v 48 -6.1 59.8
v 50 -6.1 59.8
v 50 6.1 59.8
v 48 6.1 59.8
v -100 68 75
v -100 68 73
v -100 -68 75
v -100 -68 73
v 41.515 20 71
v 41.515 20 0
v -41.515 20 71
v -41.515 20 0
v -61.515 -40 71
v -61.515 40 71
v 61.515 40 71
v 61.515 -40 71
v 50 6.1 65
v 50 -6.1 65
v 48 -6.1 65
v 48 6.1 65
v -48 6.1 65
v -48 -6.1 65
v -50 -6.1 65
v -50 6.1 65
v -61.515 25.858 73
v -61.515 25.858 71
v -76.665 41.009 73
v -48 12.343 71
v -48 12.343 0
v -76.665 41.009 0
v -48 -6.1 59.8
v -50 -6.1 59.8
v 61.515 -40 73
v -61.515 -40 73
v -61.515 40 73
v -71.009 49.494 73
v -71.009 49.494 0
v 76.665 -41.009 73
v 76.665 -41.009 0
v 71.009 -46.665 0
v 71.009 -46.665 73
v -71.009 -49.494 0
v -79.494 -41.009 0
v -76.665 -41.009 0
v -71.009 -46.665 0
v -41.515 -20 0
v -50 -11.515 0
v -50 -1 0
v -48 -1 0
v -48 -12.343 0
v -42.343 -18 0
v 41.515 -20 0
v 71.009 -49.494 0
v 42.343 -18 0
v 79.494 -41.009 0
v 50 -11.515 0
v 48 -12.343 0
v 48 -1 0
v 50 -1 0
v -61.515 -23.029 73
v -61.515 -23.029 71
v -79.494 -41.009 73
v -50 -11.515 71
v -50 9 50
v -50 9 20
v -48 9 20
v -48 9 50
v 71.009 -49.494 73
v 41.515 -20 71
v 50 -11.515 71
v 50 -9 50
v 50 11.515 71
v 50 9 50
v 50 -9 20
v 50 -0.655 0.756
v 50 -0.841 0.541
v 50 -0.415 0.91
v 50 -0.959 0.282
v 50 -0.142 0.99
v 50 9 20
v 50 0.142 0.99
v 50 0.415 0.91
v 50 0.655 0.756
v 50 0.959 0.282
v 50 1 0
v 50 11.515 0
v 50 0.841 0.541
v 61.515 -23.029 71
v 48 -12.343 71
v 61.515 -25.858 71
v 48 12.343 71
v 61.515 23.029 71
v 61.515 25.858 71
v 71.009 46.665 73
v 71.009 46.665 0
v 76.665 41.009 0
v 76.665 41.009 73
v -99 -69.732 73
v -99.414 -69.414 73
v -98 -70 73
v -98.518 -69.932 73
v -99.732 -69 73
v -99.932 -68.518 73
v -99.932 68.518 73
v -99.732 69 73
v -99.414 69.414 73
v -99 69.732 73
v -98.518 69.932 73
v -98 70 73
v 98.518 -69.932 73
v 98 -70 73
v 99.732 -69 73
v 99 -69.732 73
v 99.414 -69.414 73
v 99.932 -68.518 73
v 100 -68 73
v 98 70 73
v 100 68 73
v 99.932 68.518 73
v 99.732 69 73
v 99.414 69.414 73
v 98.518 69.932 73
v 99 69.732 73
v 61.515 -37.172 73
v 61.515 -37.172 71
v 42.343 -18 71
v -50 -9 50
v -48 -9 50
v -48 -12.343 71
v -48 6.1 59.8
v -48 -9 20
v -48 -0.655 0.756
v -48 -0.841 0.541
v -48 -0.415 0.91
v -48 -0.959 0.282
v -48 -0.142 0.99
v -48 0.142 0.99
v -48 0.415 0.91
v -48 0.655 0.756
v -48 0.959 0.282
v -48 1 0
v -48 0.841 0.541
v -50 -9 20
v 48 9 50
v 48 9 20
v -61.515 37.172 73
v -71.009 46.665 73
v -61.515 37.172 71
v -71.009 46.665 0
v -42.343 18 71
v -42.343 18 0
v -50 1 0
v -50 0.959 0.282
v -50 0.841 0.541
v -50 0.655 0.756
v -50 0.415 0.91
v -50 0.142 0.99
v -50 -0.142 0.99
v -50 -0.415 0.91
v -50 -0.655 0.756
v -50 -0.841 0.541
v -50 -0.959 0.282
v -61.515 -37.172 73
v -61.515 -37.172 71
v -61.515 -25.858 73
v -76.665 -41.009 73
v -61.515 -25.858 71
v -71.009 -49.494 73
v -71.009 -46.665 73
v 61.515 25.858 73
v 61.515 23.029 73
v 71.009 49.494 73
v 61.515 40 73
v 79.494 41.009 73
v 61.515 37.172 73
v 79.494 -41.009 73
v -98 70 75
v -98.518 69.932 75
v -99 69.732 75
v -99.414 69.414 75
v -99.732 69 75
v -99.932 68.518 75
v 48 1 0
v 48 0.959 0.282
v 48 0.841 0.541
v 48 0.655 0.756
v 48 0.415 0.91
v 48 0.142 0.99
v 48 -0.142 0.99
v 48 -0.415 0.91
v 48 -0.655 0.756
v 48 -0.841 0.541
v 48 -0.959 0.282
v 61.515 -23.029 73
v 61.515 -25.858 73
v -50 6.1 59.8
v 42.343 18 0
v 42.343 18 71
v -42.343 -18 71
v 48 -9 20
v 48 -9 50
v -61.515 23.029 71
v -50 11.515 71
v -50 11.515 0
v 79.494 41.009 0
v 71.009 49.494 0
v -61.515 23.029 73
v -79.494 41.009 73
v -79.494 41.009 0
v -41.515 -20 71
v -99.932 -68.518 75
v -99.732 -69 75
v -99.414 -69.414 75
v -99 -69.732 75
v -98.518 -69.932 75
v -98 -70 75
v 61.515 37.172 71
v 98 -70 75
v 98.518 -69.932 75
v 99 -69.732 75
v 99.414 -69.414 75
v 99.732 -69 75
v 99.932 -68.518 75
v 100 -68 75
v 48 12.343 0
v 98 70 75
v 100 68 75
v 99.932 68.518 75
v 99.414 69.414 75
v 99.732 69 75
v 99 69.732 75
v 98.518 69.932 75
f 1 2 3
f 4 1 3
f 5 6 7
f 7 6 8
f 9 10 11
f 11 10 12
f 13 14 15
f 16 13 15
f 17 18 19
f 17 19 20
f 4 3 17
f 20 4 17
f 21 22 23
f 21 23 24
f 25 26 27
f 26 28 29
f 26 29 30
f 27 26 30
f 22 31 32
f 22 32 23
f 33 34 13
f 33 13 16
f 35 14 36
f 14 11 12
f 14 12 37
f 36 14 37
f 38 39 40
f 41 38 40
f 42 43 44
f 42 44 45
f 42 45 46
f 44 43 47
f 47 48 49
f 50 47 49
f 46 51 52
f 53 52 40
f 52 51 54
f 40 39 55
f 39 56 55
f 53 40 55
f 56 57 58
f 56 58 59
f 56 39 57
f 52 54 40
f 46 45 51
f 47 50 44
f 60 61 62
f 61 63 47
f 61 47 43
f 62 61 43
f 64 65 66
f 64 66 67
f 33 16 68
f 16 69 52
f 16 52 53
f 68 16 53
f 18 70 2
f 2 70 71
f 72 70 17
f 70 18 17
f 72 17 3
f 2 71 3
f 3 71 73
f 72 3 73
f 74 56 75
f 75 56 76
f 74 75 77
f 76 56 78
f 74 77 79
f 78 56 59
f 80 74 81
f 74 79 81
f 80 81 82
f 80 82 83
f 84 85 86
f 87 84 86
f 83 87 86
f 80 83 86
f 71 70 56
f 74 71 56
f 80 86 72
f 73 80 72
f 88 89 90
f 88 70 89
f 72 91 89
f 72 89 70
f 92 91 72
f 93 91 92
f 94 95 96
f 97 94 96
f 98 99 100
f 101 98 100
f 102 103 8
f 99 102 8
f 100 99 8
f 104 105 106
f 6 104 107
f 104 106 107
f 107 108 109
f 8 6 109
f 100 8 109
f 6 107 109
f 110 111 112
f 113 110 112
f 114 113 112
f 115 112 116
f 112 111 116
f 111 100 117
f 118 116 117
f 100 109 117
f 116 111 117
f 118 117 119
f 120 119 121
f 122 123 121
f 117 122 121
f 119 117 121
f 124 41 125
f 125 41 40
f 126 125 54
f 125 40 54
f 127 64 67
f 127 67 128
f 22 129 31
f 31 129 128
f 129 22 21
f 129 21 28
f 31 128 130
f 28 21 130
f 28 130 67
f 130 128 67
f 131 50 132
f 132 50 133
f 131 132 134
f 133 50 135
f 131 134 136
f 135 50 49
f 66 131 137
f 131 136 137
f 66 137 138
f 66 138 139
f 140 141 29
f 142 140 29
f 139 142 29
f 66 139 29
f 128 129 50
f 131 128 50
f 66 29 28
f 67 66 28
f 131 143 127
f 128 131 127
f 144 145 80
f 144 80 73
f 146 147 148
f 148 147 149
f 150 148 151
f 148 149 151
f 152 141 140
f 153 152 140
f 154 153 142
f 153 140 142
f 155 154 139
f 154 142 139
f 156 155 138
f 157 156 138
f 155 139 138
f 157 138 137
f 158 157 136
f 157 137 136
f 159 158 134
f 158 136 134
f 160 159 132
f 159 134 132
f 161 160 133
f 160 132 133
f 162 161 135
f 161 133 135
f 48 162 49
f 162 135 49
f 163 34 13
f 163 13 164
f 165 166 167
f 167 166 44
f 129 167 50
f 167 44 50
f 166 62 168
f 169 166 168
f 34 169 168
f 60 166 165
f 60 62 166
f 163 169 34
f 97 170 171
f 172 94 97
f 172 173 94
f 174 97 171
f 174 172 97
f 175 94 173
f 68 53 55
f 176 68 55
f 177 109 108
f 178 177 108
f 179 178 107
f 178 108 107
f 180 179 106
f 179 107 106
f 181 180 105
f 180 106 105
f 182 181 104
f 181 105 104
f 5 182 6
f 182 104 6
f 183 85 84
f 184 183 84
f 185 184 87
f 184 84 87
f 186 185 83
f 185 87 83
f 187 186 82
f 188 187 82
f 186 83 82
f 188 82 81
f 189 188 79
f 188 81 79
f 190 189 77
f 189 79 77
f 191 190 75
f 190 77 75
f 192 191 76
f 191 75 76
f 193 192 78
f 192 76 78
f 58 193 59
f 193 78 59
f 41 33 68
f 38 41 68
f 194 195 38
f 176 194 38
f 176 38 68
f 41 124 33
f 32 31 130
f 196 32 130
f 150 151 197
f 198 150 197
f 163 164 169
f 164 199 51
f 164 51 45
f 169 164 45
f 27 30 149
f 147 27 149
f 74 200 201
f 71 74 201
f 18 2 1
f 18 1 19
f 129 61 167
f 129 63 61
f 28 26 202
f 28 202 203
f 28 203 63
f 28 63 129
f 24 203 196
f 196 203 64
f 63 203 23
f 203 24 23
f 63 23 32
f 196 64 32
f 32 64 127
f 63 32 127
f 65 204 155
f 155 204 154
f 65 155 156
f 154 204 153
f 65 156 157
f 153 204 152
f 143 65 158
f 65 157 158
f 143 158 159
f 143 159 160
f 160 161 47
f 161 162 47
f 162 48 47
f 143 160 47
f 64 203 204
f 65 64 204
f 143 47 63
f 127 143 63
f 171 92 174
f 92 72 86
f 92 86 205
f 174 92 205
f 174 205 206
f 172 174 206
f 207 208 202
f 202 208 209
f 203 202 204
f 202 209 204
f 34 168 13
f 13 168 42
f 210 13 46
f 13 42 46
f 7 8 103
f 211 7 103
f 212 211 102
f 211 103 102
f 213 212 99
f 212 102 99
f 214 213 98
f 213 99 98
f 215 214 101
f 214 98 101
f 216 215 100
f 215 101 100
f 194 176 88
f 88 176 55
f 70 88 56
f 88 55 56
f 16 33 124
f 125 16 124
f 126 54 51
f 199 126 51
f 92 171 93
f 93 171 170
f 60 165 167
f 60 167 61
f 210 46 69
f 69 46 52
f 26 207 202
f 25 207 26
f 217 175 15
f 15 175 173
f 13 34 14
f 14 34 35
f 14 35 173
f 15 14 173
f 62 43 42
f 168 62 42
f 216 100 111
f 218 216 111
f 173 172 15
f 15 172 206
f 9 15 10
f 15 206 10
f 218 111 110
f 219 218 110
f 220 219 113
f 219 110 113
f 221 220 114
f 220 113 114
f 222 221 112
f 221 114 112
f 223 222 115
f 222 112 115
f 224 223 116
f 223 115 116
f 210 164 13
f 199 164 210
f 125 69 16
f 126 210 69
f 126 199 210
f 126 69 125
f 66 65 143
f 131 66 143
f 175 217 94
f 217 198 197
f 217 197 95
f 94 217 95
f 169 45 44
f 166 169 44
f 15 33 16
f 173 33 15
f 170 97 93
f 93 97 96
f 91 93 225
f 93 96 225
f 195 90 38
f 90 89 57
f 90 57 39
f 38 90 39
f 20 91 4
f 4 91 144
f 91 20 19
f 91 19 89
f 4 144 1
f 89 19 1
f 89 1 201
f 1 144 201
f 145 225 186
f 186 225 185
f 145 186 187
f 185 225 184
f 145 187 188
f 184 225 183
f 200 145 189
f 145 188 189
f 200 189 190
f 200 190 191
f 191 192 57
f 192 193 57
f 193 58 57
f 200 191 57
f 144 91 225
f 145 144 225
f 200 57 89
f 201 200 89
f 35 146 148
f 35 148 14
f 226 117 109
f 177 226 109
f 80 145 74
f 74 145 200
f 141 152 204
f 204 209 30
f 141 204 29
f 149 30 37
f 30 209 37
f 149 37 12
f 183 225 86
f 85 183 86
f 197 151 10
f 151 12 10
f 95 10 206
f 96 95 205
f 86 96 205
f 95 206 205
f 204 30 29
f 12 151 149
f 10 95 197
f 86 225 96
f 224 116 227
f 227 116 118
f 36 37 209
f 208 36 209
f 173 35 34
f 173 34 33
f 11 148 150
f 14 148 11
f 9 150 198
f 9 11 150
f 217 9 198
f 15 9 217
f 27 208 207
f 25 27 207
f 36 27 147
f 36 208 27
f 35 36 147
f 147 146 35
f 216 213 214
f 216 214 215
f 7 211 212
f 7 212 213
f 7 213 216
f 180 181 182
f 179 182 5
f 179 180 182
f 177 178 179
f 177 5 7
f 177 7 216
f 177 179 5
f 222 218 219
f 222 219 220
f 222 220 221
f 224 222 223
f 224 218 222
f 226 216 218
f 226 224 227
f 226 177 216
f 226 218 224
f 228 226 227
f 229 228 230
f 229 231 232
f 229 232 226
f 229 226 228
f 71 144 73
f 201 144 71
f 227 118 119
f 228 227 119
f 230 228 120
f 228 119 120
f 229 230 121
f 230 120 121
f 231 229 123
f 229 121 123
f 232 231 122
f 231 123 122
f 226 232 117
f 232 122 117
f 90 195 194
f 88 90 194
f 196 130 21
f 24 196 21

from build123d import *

# Parameters (mm, degrees)
F2_DEPTH  = 2
F5_DEPTH  = 73
F6_W      = 123.029438
F6_H      = 80
F7_DEPTH  = 2
F9_DEPTH  = 2
F10_W     = 18
F10_H     = 30
F11_DEPTH = 150.001
F12_W     = 12.2
F12_H     = 5.2
F13_DEPTH = 150.001
F15_DEPTH = 150.001


with BuildPart() as f2:
    # F1 (on offset) → F2 (new body)
    with BuildSketch(Plane.XY.offset(73)):
        with BuildLine():
            Line((98, 70), (-98, 70))
            ThreePointArc((-98, 70), (-99.414214, 69.414214), (-100, 68))
            Line((-100, 68), (-100, -68))
            ThreePointArc((-100, -68), (-99.414214, -69.414214), (-98, -70))
            Line((-98, -70), (98, -70))
            ThreePointArc((98, -70), (99.414214, -69.414214), (100, -68))
            Line((100, -68), (100, 68))
            ThreePointArc((100, 68), (99.414214, 69.414214), (98, 70))
        make_face()
    extrude(amount=F2_DEPTH)


with BuildPart() as f5:
    # F4 (on Top) → F5 (new body, through all)
    with BuildSketch(Plane.XY):
        Polygon((41.514719, 20), (-41.514719, 20), (-71.008622, 49.493903), (-79.493903, 41.008622), (-50, 11.514719), (-50, -11.514719), (-79.493903, -41.008622), (-71.008622, -49.493903), (-41.514719, -20), (41.514719, -20), (71.008622, -49.493903), (79.493903, -41.008622), (50, -11.514719), (50, 11.514719), (79.493903, 41.008622), (71.008622, 49.493903), align=None)
        Polygon((-76.665476, 41.008622), (-71.008622, 46.665476), (-42.343146, 18), (42.343146, 18), (71.008622, 46.665476), (76.665476, 41.008622), (48, 12.343146), (48, -12.343146), (76.665476, -41.008622), (71.008622, -46.665476), (42.343146, -18), (-42.343146, -18), (-71.008622, -46.665476), (-76.665476, -41.008622), (-48, -12.343146), (-48, 12.343146), align=None, mode=Mode.SUBTRACT)
    extrude(amount=F5_DEPTH)


with BuildPart() as f7:
    # F6 (on offset) → F7 (new body)
    with BuildSketch(Plane.XY.offset(73)):
        Rectangle(F6_W, F6_H)
    extrude(amount=-F7_DEPTH)


with BuildPart() as f5_1:
    add(f5.part)

    # F8: cut F7
    add(f7.part, mode=Mode.SUBTRACT)

    # F10 (on face) → F11 (cut, through all)
    with BuildSketch(Plane(origin=(-50, 0, 0), x_dir=(0, -1, 0), z_dir=(-1, 0, 0))):
        with Locations((0, 35)):
            Rectangle(F10_W, F10_H)
    extrude(amount=-F11_DEPTH, mode=Mode.SUBTRACT)

    # F12 (on face) → F13 (cut, through all)
    with BuildSketch(Plane.YZ.offset(50)):
        with Locations((0, 62.4)):
            Rectangle(F12_W, F12_H)
    extrude(amount=-F13_DEPTH, mode=Mode.SUBTRACT)

    # F14 (on face) → F15 (cut, through all)
    with BuildSketch(Plane.YZ.offset(50)):
        with BuildLine():
            ThreePointArc((1, 0), (0, 1), (-1, 0))
            Line((-1, 0), (1, 0))
        make_face()
    extrude(amount=-F15_DEPTH, mode=Mode.SUBTRACT)


with BuildPart() as f9:
    # F6 (on offset) → F9 (new body, through all)
    with BuildSketch(Plane.XY.offset(73)):
        Rectangle(F6_W, F6_H)
    extrude(amount=-F9_DEPTH)


solid = Compound([f2.part, f5_1.part, f9.part])
